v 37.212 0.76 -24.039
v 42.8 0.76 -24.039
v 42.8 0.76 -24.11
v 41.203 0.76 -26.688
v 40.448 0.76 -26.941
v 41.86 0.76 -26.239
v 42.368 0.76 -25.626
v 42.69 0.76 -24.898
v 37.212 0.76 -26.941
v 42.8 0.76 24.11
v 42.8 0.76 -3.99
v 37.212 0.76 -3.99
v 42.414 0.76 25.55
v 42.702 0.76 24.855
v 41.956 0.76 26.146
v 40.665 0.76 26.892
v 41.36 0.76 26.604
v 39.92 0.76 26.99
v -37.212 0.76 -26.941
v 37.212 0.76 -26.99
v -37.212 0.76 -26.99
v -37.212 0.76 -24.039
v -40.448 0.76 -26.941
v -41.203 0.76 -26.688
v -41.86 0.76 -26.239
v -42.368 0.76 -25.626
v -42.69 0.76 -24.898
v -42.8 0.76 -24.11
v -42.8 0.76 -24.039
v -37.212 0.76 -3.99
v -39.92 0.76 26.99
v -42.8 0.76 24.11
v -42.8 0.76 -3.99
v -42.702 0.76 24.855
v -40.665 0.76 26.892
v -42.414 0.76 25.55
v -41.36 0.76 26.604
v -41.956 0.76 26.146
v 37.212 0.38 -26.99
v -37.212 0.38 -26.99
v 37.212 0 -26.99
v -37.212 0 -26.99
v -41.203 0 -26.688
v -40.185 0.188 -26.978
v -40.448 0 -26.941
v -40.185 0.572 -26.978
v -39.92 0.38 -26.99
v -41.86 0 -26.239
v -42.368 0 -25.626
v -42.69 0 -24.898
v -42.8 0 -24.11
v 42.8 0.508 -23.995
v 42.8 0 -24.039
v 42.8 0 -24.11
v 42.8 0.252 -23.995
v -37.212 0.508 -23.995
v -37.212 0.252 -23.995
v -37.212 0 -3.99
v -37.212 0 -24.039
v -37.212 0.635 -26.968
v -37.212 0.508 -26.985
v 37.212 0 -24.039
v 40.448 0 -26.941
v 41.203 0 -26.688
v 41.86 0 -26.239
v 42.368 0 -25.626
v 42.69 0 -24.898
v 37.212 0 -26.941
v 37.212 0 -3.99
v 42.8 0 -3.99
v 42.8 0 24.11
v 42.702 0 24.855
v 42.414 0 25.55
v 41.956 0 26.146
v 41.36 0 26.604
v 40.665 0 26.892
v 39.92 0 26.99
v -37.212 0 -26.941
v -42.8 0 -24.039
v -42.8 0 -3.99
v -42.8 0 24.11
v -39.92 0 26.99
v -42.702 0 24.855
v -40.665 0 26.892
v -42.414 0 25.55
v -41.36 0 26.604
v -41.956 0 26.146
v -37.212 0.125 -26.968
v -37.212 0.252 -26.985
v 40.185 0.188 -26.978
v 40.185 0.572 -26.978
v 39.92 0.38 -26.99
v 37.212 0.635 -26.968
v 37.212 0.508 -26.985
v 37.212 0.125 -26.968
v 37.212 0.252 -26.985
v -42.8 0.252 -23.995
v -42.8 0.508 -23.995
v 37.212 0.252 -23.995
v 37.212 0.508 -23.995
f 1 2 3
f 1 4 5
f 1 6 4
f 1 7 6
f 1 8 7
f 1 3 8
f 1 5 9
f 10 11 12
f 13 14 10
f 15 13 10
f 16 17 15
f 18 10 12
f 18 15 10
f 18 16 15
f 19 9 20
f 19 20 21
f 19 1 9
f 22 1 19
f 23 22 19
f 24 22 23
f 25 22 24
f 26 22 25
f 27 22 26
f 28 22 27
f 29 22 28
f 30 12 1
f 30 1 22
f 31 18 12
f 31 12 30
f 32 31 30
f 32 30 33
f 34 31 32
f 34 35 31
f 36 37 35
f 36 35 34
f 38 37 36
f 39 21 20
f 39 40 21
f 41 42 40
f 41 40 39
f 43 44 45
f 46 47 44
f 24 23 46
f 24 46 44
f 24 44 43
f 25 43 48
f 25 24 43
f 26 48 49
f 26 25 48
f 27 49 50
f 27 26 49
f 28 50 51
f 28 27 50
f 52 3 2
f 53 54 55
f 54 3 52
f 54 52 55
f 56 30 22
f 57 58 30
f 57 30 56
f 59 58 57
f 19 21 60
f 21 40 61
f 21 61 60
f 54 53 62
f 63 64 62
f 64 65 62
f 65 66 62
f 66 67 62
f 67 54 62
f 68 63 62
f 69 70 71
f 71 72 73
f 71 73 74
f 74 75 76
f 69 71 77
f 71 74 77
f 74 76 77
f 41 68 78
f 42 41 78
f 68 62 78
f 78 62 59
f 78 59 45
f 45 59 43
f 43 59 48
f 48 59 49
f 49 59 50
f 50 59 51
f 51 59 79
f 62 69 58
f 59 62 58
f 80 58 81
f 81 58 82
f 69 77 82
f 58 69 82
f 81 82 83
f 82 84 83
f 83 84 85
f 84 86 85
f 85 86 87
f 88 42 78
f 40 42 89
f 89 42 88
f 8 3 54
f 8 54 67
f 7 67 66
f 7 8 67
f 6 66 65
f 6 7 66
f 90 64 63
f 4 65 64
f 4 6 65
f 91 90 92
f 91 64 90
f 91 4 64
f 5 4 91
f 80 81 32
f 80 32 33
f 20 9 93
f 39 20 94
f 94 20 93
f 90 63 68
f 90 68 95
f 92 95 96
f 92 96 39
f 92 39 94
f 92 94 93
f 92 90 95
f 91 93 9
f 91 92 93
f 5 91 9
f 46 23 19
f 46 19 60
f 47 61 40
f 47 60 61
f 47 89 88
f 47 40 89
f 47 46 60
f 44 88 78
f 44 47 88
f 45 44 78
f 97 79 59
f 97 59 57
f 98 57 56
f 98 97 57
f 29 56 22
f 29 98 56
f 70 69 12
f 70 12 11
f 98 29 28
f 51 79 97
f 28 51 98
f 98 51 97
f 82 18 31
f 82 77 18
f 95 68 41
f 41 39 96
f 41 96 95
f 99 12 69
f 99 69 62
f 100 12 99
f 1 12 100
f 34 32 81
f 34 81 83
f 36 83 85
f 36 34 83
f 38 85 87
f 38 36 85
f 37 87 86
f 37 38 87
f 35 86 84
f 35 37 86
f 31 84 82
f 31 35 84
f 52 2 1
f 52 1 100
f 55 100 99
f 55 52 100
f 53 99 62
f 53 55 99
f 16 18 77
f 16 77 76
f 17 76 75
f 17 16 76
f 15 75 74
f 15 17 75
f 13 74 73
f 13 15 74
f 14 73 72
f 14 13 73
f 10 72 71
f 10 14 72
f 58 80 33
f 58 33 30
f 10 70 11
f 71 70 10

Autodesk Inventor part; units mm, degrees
ref_plane "YZ Plane" through (0, 0, 0) normal (1, 0, 0) x (0, 1, 0)
ref_plane "XZ Plane" through (0, 0, 0) normal (0, 1, 0) x (-1, 0, 0)
ref_plane "XY Plane" through (0, 0, 0) normal (0, 0, 1) x (1, 0, 0)
sketch "Sketch1" plane through (0, 0, 0) normal (0, 1, 0) x (-1, 0, 0)
  line L0 (42.8, -26.99) -> (-42.8, -26.99)
  line L1 (-42.8, -26.99) -> (-42.8, 26.99)
  line L2 (-42.8, 26.99) -> (42.8, 26.99)
  line L3 (42.8, 26.99) -> (42.8, -26.99)
  line L4 (42.8, -26.99) -> (-42.8, 26.99) construction
  line L5 (-42.8, -26.99) -> (42.8, 26.99) construction
  point P0 (0, 0)
  dimension "d0" = 85.6
  dimension "d1" = 53.98
extrude "Extrusion1" add sketch "Sketch1" along normal blind 0.76
fillet "Fillet1" radius 2.88 4 edges at (42.8, 0.38, 26.99) (42.8, 0.38, -26.99) (-42.8, 0.38, 26.99) (-42.8, 0.38, -26.99)
sketch "Sketch2" plane through (0, 0, 0) normal (0, -1, 0) x (1, 0, 0)
  arc A0 (-42.8, -24.11) -> (-39.92, -26.99) centre (-39.92, -24.11) ccw projected
  line L0 (-39.92, -26.99) -> (39.92, -26.99) projected
  arc A1 (39.92, -26.99) -> (42.8, -24.11) centre (39.92, -24.11) ccw projected
  line L1 (42.8, -24.11) -> (42.8, 24.11) projected
  arc A2 (42.8, 24.11) -> (39.92, 26.99) centre (39.92, 24.11) ccw projected
  line L2 (39.92, 26.99) -> (-39.92, 26.99) projected
  arc A3 (-39.92, 26.99) -> (-42.8, 24.11) centre (-39.92, 24.11) ccw projected
  line L3 (-42.8, 24.11) -> (-42.8, -24.11) projected
  line L4 (-42.8, 24.11) -> (-42.8, -24.11) projected
  line L5 (-42.8, -3.99) -> (-37.212, -3.99)
  line L6 (-37.212, -3.99) -> (-37.212, -23.99)
  line L7 (-37.212, -23.99) -> (-42.8, -23.99)
  line L8 (-42.8, -23.99) -> (-42.8, -3.99)
  line L9 (42.8, 24.11) -> (42.8, -24.11) projected
  line L10 (42.8, -23.99) -> (37.212, -23.99)
  line L11 (37.212, -23.99) -> (37.212, -3.99)
  line L12 (37.212, -3.99) -> (42.8, -3.99)
  line L13 (42.8, -3.99) -> (42.8, -23.99)
  point P0 (0, 0)
  dimension "d5" = 5.588
  dimension "d6" = 5.588
  dimension "d7" = 3
  dimension "d8" = 3
  dimension "d9" = 20
  dimension "d10" = 20
extrude "Extrusion2" cut sketch "Sketch2" against normal through all contours L3 L5 L6 L7 | L10 L11 L12 L1
sketch "Sketch3" plane through (42.8, 0, 24.11) normal (1, 0, 0) x (0, 0, -1)
  line L0 (51.1, 0) -> (51.1, 0.76) projected
  line L1 (51.1, 0) -> (51.1, 0.76)
  line L2 (48.1, 0.76) -> (48.1, 0)
  line L3 (48.1, 0) -> (51.1, 0.76) construction
  line L4 (51.1, 0) -> (48.1, 0.76) construction
  line L5 (51.1, 0) -> (48.22, 0) projected
  arc A0 (48.1489, 0.76) -> (48.1489, 0) centre (49.6, 0.38) ccw
  arc A1 (51.0511, 0) -> (51.0511, 0.76) centre (49.6, 0.38) ccw
  line L6 (48.1, 0) -> (48.1489, 0)
  line L7 (51.0511, 0) -> (51.1, 0)
  line L8 (51.1, 0.76) -> (51.0511, 0.76)
  line L9 (48.1489, 0.76) -> (48.1, 0.76)
  point P0 (24.11, 0)
  point P1 (48.1, 0.38)
  point P2 (51.1, 0.38)
  dimension "d14" = 3
  dimension "d15" = 0.76
  dimension "d16" = 1.5
  dimension "d17" = 1.5
  dimension "d18" = 1.5
extrude "Extrusion3" cut sketch "Sketch3" against normal up to surface (5.588 mm away)
mirror "Mirror1" about plane through (0, 0, 0) normal (1, 0, 0) of "Extrusion3"
sketch "Sketch4" plane through (0, 0, 0) normal (0, -1, 0) x (1, 0, 0)
  line L0 (-37.212, -24.0389) -> (-42.8, -24.0389) projected
  line L1 (-42.8, -24.0389) -> (-42.8, -24.11) projected
  arc A0 (-42.8, -24.11) -> (-40.4486, -26.9411) centre (-39.92, -24.11) ccw projected
  line L2 (-40.4486, -26.9411) -> (-37.212, -26.9411) projected
  line L3 (-37.212, -26.9411) -> (-37.212, -26.99) projected
  line L4 (-37.212, -26.99) -> (37.212, -26.99) projected
  line L5 (37.212, -26.99) -> (37.212, -26.9411) projected
  line L6 (37.212, -26.9411) -> (40.4486, -26.9411) projected
  arc A1 (40.4486, -26.9411) -> (42.8, -24.11) centre (39.92, -24.11) ccw projected
  line L7 (42.8, -24.11) -> (42.8, -24.0389) projected
  line L8 (42.8, -24.0389) -> (37.212, -24.0389) projected
  line L9 (37.212, -24.0389) -> (37.212, -3.99) projected
  line L10 (37.212, -3.99) -> (42.8, -3.99) projected
  line L11 (42.8, -3.99) -> (42.8, 24.11) projected
  arc A2 (42.8, 24.11) -> (39.92, 26.99) centre (39.92, 24.11) ccw projected
  line L12 (39.92, 26.99) -> (-39.92, 26.99) projected
  arc A3 (-39.92, 26.99) -> (-42.8, 24.11) centre (-39.92, 24.11) ccw projected
  line L13 (-42.8, 24.11) -> (-42.8, -3.99) projected
  line L14 (-42.8, -3.99) -> (-37.212, -3.99) projected
  line L15 (-37.212, -3.99) -> (-37.212, -24.0389) projected
  line L16 (39.92, 26.99) -> (-39.92, 26.99) projected
  line L17 (42.8, -3.99) -> (42.8, 24.11) projected
  line L18 (-42.8, 24.11) -> (-42.8, -3.99) projected
  line L19 (-42.8, 26.99) -> (42.8, 26.99) construction
  line L20 (42.8, 26.99) -> (42.8, -27.0263) construction
  line L21 (42.8, -27.0263) -> (-42.8, -27.0263) construction
  line L22 (-42.8, -27.0263) -> (-42.8, 26.99) construction
  point P0 (0, 0)
decal "Decal1"
sketch "Sketch5" plane through (0, 0.76, 0) normal (0, 1, 0) x (1, 0, 0)
  line L0 (-42.8, 24.0389) -> (-37.212, 24.0389) projected
  line L1 (-37.212, 24.0389) -> (-37.212, 3.99) projected
  line L2 (-37.212, 3.99) -> (-42.8, 3.99) projected
  line L3 (-42.8, 3.99) -> (-42.8, -24.11) projected
  arc A0 (-42.8, -24.11) -> (-39.92, -26.99) centre (-39.92, -24.11) ccw projected
  line L4 (-39.92, -26.99) -> (39.92, -26.99) projected
  arc A1 (39.92, -26.99) -> (42.8, -24.11) centre (39.92, -24.11) ccw projected
  line L5 (42.8, -24.11) -> (42.8, 3.99) projected
  line L6 (42.8, 3.99) -> (37.212, 3.99) projected
  line L7 (37.212, 3.99) -> (37.212, 24.0389) projected
  line L8 (37.212, 24.0389) -> (42.8, 24.0389) projected
  line L9 (42.8, 24.0389) -> (42.8, 24.11) projected
  arc A2 (42.8, 24.11) -> (40.4486, 26.9411) centre (39.92, 24.11) ccw projected
  line L10 (40.4486, 26.9411) -> (37.212, 26.9411) projected
  line L11 (37.212, 26.9411) -> (37.212, 26.99) projected
  line L12 (37.212, 26.99) -> (-37.212, 26.99) projected
  line L13 (-37.212, 26.99) -> (-37.212, 26.9411) projected
  line L14 (-37.212, 26.9411) -> (-40.4486, 26.9411) projected
  arc A3 (-40.4486, 26.9411) -> (-42.8, 24.11) centre (-39.92, 24.11) ccw projected
  line L15 (-42.8, 24.11) -> (-42.8, 24.0389) projected
  line L16 (-42.8, 3.99) -> (-42.8, -24.11) projected
  line L17 (-42.8, 27.0263) -> (42.8, 27.0263) construction
  line L18 (42.8, 27.0263) -> (42.8, -26.99) construction
  line L19 (42.8, -26.99) -> (-42.8, -26.99) construction
  line L20 (-42.8, -26.99) -> (-42.8, 27.0263) construction
  line L21 (42.8, -24.11) -> (42.8, 3.99) projected
  point P0 (0, 0)
decal "Decal2"
equation "\"d0\" = cardWidth"
equation "\"d1\" = cardHeight"
equation "\"d2\" = cardThickness"
equation "\"d4\" = cardFillet"
equation "\"d5\" = spoolThickness"
equation "\"d6\" = spoolThickness"
equation "\"d7\" = cardPinDiameter"
equation "\"d8\" = cardPinDiameter"
equation "\"d9\" = cardCutoutHeight"
equation "\"d10\" = cardCutoutHeight"
equation "\"d11\" = cardThickness"
equation "\"d14\" = cardPinDiameter"
equation "\"d15\" = cardThickness"
equation "\"d16\" = 0.5 * cardPinDiameter"
equation "\"d18\" = 0.5 * cardPinDiameter"
equation "\"d19\" = cardThickness"
equation "\"materialThickness\" = 3.175"
equation "\"laserKerf\" = 0.12"
equation "\"cardPinDiameter\" = 3"
equation "\"centeralShaftDiameter\" = 8"
equation "\"cardWidth\" = 85.6"
equation "\"cardHeight\" = 53.98"
equation "\"cardThickness\" = 0.76"
equation "\"cardFillet\" = 2.88"
equation "\"cardCutoutHeight\" = 20"
equation "\"d13\" = cardPinDiameter"
equation "\"cardSelected\" = 1"
equation "\"cardClearence\" = 0.5"
equation "\"bearingOd\" = 22"
equation "\"bearingWidth\" = 8"
equation "\"axleHeight\" = 95"
equation "\"nutTrapwidth\" = 5.5"
equation "\"nutTrapClearence\" = 2"
equation "\"nutTrapDepth\" = 2.5"
equation "\"magnetDiameter\" = 6"
equation "\"magnetLength\" = 3"
equation "\"magnetProtusion\" = 0.25"
equation "\"spoolThickness\" = 5.588"
properties part number "card-01" material "ABS Plastic"
